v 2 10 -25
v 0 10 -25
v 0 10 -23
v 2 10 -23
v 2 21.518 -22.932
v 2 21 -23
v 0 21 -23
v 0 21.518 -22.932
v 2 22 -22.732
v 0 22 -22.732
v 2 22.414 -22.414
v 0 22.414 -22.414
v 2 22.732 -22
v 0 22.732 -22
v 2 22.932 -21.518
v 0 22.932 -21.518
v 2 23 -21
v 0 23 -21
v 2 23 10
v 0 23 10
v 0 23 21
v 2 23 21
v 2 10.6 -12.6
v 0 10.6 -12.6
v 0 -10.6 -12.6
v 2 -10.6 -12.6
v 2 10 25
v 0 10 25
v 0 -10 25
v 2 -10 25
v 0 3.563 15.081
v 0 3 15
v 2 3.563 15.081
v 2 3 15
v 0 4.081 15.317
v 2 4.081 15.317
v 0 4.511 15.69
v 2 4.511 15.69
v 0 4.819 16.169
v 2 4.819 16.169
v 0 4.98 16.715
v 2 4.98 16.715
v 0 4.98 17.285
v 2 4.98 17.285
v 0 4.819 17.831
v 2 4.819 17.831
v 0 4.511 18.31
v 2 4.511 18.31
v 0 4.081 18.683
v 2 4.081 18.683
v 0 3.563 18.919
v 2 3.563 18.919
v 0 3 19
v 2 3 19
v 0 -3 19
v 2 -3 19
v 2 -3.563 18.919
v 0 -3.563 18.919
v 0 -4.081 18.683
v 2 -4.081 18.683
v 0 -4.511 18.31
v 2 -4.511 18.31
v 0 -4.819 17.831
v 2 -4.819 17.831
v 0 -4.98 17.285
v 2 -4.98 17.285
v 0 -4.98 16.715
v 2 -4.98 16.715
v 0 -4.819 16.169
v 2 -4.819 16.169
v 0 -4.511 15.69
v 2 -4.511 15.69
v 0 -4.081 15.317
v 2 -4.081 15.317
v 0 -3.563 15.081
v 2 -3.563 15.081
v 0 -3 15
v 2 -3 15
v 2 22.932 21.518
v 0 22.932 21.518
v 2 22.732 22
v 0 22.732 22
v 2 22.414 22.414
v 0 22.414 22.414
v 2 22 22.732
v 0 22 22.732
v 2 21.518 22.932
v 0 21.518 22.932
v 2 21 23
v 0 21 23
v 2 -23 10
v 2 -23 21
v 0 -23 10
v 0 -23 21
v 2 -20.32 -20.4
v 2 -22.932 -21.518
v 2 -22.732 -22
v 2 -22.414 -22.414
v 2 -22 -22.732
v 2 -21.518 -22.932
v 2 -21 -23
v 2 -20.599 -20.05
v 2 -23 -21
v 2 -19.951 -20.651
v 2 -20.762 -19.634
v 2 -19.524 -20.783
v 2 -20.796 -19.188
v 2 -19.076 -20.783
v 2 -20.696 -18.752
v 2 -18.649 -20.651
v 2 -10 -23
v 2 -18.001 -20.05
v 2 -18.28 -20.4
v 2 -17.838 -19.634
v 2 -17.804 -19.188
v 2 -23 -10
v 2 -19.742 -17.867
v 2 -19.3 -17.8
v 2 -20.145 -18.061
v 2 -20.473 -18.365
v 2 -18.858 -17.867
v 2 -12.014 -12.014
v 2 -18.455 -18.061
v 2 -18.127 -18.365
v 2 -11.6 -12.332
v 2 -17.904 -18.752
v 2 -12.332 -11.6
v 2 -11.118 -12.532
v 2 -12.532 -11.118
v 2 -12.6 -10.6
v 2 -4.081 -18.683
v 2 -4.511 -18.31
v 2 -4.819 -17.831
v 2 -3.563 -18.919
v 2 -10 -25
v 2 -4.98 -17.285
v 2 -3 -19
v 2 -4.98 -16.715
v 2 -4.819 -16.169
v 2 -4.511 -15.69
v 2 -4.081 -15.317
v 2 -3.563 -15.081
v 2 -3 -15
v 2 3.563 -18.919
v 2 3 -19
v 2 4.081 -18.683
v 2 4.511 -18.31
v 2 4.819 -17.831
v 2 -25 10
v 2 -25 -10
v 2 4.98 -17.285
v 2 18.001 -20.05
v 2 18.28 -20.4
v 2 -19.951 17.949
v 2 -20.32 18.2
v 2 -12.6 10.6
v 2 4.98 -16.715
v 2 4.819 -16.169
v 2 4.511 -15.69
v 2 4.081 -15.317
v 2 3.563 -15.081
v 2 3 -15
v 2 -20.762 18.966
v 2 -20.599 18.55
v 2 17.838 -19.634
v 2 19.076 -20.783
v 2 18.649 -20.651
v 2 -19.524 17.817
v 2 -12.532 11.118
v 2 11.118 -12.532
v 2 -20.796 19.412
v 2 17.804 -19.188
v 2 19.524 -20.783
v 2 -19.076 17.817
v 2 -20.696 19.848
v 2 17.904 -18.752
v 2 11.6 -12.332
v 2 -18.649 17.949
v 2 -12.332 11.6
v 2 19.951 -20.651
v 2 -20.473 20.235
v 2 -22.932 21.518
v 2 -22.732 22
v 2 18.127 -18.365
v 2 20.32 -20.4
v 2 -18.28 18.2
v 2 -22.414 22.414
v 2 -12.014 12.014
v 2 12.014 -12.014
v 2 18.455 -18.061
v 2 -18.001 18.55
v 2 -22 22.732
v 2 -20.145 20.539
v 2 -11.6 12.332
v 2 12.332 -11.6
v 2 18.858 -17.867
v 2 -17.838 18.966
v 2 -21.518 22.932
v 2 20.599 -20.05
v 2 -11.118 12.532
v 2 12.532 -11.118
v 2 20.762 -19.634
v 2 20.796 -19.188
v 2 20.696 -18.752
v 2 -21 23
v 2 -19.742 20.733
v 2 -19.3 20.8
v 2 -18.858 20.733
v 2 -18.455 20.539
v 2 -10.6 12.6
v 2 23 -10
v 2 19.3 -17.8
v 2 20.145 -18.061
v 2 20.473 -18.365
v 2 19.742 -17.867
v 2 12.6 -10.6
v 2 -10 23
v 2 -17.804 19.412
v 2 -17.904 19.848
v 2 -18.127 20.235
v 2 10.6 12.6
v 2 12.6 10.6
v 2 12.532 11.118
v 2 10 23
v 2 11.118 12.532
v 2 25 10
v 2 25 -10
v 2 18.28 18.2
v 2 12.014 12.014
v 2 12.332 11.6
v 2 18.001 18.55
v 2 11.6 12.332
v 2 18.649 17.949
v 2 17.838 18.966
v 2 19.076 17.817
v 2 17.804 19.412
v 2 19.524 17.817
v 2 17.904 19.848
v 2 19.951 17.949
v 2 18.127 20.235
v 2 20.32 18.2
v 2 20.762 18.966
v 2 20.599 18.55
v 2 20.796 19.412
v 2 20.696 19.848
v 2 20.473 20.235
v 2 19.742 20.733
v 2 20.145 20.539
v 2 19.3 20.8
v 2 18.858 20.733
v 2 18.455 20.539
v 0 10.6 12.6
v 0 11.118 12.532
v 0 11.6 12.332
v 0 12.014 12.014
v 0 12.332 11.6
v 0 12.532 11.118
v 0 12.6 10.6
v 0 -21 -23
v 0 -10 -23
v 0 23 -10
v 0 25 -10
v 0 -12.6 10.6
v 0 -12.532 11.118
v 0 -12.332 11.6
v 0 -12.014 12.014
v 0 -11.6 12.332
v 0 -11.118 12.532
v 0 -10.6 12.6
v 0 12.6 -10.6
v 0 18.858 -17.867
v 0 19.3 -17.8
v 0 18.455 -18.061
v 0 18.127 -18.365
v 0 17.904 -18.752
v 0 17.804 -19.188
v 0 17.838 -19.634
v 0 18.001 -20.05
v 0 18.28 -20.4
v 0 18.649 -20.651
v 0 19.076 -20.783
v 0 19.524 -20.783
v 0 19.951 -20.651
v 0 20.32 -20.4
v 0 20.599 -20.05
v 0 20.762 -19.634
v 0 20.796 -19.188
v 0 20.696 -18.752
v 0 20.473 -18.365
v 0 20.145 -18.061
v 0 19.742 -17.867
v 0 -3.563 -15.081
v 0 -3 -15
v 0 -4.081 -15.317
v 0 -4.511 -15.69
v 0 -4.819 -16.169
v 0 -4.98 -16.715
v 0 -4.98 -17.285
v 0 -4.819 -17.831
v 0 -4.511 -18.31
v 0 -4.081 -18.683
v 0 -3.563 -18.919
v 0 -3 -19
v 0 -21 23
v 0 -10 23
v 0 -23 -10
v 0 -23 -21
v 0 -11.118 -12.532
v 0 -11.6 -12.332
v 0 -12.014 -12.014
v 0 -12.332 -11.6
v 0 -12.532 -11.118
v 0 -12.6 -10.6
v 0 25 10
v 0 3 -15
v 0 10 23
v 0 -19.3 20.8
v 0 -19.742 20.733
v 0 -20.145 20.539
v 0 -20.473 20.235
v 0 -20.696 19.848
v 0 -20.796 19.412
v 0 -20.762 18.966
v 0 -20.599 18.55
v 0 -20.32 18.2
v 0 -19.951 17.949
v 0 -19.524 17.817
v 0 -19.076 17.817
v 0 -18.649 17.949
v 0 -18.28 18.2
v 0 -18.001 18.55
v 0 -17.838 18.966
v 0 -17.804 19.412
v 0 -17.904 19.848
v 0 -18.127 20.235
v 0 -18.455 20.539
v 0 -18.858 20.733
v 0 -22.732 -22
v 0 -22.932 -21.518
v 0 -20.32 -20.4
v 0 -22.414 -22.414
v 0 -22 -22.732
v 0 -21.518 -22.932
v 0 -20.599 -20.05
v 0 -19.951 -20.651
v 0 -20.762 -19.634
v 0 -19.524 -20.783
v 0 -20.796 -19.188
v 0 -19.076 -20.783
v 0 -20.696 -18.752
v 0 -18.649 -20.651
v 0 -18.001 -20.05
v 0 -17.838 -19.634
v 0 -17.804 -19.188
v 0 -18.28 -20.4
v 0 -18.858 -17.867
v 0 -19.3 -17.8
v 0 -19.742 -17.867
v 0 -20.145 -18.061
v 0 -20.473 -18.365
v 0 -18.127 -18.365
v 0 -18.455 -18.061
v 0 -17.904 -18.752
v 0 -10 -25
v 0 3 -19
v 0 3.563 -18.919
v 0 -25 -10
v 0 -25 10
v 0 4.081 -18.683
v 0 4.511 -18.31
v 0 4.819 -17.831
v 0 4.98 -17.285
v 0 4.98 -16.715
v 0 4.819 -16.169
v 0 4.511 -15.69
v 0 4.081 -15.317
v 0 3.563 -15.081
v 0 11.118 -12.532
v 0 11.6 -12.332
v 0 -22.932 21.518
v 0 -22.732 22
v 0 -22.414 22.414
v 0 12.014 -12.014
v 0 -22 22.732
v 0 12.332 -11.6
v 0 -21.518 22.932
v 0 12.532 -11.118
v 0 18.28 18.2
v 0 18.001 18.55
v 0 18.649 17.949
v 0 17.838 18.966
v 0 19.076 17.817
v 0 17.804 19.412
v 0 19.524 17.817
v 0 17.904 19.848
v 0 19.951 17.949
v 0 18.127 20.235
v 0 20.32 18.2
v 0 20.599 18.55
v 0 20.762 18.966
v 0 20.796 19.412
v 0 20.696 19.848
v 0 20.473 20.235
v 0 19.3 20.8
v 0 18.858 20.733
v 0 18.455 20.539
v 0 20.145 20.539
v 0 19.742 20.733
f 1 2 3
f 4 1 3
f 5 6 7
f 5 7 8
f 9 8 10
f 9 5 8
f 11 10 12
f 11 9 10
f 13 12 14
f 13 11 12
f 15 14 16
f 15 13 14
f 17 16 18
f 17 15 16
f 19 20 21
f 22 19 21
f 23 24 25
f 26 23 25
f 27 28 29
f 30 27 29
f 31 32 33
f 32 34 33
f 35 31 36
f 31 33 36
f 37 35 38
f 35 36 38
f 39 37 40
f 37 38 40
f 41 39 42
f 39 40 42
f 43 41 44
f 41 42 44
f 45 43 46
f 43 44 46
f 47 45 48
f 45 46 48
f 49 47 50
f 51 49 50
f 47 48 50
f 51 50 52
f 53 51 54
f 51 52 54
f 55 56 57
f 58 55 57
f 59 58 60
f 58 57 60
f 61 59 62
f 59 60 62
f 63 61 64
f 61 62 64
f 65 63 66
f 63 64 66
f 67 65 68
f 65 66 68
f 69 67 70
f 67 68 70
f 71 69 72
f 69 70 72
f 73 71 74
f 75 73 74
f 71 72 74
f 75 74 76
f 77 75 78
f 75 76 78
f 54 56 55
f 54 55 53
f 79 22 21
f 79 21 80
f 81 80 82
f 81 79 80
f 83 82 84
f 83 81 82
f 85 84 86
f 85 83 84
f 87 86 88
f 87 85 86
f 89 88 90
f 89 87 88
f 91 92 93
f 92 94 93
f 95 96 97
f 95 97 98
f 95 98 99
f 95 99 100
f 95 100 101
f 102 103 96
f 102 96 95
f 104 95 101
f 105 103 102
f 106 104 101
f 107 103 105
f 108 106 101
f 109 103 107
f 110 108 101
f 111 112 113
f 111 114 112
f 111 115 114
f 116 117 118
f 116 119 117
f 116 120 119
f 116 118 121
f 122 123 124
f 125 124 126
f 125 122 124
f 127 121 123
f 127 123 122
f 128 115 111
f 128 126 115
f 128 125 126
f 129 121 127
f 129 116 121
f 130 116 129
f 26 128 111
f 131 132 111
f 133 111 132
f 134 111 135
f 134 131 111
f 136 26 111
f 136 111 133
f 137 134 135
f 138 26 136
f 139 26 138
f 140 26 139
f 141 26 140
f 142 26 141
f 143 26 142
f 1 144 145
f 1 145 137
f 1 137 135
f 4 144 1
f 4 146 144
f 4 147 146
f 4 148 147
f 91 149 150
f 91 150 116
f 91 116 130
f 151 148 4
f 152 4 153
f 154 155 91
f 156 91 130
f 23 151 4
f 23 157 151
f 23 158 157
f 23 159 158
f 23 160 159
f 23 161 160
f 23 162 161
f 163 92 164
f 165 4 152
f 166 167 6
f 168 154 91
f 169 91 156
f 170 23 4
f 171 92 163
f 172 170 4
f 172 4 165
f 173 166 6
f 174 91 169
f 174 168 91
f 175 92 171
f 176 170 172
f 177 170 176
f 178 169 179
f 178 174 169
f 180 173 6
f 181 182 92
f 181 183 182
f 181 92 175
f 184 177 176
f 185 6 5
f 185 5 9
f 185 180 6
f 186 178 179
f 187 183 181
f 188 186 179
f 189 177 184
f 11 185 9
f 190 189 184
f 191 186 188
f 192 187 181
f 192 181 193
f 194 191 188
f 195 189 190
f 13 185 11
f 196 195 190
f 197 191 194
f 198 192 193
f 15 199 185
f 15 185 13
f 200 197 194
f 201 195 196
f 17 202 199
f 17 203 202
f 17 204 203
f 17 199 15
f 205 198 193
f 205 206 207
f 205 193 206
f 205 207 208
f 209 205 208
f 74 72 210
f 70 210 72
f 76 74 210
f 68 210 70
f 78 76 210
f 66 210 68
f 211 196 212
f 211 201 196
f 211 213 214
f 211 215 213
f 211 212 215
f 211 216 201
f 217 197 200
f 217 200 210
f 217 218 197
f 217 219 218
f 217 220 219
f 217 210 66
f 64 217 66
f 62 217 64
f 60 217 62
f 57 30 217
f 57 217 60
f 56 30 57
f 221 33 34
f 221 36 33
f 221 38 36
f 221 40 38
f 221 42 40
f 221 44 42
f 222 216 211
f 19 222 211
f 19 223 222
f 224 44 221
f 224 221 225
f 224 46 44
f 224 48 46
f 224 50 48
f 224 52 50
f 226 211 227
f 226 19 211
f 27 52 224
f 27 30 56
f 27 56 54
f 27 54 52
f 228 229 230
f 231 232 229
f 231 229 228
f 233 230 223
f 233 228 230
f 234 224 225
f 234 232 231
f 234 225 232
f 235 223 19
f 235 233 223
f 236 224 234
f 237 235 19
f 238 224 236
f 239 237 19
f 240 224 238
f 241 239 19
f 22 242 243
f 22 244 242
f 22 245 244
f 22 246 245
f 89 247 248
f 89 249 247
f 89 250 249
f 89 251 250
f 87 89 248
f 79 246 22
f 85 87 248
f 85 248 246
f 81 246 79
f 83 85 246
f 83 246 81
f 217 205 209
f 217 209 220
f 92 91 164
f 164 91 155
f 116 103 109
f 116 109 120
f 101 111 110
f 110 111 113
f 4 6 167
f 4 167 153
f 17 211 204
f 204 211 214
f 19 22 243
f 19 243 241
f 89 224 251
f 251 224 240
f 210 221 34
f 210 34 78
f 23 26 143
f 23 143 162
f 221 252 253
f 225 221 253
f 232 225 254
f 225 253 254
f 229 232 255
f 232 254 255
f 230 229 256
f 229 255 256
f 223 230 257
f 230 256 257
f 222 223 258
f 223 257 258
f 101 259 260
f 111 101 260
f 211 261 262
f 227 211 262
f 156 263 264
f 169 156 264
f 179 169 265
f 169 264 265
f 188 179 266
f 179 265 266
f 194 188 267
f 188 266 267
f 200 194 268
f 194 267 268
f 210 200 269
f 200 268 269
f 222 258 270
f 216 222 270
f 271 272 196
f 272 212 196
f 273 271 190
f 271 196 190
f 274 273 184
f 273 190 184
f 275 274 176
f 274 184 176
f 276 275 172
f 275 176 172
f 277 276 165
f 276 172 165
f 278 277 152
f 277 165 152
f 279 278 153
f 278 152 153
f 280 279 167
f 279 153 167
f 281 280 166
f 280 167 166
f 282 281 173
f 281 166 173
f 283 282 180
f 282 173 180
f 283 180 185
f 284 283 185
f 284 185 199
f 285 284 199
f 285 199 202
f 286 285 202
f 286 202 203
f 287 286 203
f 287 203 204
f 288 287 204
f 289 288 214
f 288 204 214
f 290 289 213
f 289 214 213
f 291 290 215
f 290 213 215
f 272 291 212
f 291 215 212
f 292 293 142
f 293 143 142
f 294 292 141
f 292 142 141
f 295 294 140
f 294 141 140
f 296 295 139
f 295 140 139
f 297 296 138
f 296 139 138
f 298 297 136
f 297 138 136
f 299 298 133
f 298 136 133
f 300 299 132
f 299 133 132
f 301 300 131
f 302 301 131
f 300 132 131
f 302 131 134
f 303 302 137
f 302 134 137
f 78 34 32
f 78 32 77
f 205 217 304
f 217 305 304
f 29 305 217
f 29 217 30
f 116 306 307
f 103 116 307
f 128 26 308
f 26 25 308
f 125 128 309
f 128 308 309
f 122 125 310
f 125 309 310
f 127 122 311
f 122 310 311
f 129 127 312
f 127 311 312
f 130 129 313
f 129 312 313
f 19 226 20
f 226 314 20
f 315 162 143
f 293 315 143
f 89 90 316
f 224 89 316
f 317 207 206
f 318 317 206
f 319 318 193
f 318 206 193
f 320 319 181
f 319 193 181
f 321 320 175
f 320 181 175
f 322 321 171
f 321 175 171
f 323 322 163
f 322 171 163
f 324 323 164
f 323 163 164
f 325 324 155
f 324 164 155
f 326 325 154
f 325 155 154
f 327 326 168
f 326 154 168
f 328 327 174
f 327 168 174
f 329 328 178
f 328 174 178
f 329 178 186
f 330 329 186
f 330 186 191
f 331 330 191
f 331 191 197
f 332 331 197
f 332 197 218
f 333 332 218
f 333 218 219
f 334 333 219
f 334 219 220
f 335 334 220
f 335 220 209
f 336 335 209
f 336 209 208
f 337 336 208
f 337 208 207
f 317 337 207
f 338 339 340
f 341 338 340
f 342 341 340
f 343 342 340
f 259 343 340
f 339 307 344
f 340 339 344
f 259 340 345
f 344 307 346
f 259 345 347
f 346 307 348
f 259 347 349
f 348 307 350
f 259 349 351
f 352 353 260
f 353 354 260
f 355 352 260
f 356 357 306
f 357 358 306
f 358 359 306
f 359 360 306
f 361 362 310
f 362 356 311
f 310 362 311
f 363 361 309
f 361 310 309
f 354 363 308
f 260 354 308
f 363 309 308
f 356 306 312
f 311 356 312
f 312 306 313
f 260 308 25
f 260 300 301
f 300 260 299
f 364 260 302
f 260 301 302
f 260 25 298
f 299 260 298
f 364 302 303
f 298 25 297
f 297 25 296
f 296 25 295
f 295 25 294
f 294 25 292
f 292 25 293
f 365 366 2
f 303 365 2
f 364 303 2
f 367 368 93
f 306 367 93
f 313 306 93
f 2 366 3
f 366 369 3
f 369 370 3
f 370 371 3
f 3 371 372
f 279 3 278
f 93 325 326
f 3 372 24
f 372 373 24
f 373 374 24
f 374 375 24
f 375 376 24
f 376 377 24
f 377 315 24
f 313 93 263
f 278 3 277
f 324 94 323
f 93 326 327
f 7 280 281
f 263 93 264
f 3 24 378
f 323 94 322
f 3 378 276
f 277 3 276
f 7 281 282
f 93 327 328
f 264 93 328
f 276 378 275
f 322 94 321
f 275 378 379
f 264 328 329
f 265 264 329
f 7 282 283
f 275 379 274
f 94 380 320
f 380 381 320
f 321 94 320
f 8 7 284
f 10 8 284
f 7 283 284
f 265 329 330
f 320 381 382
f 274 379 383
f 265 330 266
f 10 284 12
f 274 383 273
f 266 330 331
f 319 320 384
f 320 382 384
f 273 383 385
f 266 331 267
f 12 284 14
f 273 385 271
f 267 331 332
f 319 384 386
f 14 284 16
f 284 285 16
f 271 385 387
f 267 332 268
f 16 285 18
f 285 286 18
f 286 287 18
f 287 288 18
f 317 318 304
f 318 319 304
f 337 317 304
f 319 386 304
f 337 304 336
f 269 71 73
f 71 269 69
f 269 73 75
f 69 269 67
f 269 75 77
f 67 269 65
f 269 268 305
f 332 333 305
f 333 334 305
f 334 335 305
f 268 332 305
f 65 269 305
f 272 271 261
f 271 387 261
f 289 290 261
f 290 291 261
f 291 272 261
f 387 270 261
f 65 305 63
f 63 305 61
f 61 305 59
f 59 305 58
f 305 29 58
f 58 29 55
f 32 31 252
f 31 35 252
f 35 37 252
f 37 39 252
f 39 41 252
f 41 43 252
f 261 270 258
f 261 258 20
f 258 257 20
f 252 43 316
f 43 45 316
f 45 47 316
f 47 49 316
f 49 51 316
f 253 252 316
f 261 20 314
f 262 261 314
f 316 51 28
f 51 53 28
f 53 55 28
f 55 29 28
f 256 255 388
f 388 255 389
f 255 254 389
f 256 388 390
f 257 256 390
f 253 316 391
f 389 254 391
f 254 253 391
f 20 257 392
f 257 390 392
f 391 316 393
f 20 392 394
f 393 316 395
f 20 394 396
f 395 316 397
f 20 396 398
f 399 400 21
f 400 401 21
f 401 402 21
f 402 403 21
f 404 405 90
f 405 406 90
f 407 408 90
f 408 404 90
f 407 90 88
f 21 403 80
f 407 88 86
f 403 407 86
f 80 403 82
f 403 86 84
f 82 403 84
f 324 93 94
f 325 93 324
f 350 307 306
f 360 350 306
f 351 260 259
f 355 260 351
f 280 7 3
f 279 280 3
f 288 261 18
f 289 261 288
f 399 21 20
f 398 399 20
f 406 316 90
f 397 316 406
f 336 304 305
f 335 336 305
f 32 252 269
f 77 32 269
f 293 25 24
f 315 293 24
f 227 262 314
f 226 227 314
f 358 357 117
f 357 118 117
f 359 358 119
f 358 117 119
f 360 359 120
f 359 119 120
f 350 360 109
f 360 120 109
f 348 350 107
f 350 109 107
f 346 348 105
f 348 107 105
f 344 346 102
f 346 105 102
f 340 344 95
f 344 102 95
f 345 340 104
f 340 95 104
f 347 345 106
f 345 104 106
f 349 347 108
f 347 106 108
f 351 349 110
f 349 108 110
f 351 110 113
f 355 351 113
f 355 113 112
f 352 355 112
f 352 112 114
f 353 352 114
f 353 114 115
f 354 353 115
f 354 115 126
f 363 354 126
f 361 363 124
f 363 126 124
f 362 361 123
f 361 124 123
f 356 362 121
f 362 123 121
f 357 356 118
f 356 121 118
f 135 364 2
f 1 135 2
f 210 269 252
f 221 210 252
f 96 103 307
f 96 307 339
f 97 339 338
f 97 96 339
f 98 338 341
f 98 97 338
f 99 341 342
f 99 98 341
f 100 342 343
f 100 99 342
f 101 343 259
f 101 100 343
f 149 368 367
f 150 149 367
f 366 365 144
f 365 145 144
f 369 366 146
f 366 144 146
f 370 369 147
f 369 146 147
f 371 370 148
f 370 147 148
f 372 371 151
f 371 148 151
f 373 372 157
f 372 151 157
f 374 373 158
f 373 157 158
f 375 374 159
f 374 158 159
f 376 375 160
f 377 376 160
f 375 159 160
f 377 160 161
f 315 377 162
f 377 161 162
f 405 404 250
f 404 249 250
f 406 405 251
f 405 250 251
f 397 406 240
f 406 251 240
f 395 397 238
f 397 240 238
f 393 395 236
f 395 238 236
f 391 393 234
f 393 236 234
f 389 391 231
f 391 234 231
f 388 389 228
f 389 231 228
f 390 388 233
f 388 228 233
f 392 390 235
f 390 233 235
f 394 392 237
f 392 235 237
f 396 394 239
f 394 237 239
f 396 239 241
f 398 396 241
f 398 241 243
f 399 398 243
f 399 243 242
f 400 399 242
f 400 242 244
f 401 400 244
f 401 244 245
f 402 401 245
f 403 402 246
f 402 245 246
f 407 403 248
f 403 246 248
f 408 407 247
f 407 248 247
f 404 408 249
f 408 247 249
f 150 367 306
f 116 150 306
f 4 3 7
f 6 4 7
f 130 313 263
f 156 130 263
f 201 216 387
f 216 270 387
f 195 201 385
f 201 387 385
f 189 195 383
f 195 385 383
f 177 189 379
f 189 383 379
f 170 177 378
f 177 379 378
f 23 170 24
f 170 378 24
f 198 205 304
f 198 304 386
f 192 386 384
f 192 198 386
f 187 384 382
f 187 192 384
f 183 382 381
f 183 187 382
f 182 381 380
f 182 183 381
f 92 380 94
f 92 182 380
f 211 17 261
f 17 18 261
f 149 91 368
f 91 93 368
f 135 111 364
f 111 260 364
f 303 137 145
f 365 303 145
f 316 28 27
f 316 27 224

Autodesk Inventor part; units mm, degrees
ref_plane "YZ Plane" through (0, 0, 0) normal (1, 0, 0) x (0, 1, 0)
ref_plane "XZ Plane" through (0, 0, 0) normal (0, 1, 0) x (-1, 0, 0)
ref_plane "XY Plane" through (0, 0, 0) normal (0, 0, 1) x (1, 0, 0)
sketch "Sketch1" plane through (0, 0, 0) normal (1, 0, 0) x (0, 1, 0)
  line L0 (-25, -25) -> (25, -25)
  line L1 (25, -25) -> (25, 25)
  line L2 (25, 25) -> (-25, 25)
  line L3 (-25, 25) -> (-25, -25)
  line L4 (-25, -25) -> (25, 25) construction
  line L5 (25, -25) -> (-25, 25) construction
  line L6 (-24, -24) -> (24, -24)
  line L7 (24, -24) -> (24, 24)
  line L8 (24, 24) -> (-24, 24)
  line L9 (-24, 24) -> (-24, -24)
  line L10 (-24, -24) -> (24, 24) construction
  line L11 (24, -24) -> (-24, 24) construction
  point P0 (0, 0)
  dimension "d0" = 50
  dimension "d1" = 50
  dimension "d2" = 48
  dimension "d3" = 48
extrude "Extrusion1" add sketch "Sketch1" along normal blind 2 contours L3 L2 L1 L0 | L9 L8 L7 L6
sketch "Sketch3" plane through (0, 0, 0) normal (-1, 0, 0) x (0, 0, 1)
  line L0 (19.3, -19.3) -> (-19.3, -19.3)
  line L1 (-19.3, -19.3) -> (-19.3, 19.3)
  line L2 (-19.3, 19.3) -> (19.3, 19.3)
  line L3 (19.3, 19.3) -> (19.3, -19.3)
  line L4 (19.3, -19.3) -> (-19.3, 19.3) construction
  line L5 (-19.3, -19.3) -> (19.3, 19.3) construction
  circle A0 centre (-19.3, 19.3) radius 1.5
  circle A1 centre (19.3, 19.3) radius 1.5555
  circle A2 centre (19.3, -19.3) radius 1.5555
  circle A3 centre (-19.3, -19.3) radius 1.5555
  point P0 (0, 0)
  dimension "d6" = 38.6
  dimension "d7" = 38.6
  dimension "d8" = 3
  dimension "d9" = 3.111
  dimension "d10" = 3.111
  dimension "d11" = 3.111
hole "Hole1" at (0, 19.3, -19.3) direction (1, 0, 0) diameter 3 end through all
sketch "Sketch4" plane through (0, 0, 0) normal (-1, 0, 0) x (0, 0, 1)
  line L0 (-19.3, -19.3) -> (19.3, -19.3)
  line L1 (19.3, -19.3) -> (19.3, 19.3)
  line L2 (19.3, 19.3) -> (-19.3, 19.3)
  line L3 (-19.3, 19.3) -> (-19.3, -19.3)
  line L4 (-19.3, -19.3) -> (19.3, 19.3) construction
  line L5 (19.3, -19.3) -> (-19.3, 19.3) construction
  circle A0 centre (19.3, 19.3) radius 1.5
  point P0 (0, 0)
  dimension "d19" = 38.6
  dimension "d20" = 38.6
  dimension "d21" = 3
hole "Hole2" at (0, 19.3, 19.3) direction (1, 0, 0) diameter 3 end through all
sketch "Sketch5" plane through (0, 0, 0) normal (-1, 0, 0) x (0, 0, 1)
  line L0 (19.3, -19.3) -> (-19.3, -19.3)
  line L1 (-19.3, -19.3) -> (-19.3, 19.3)
  line L2 (-19.3, 19.3) -> (19.3, 19.3)
  line L3 (19.3, 19.3) -> (19.3, -19.3)
  line L4 (19.3, -19.3) -> (-19.3, 19.3) construction
  line L5 (-19.3, -19.3) -> (19.3, 19.3) construction
  circle A0 centre (-19.3, -19.3) radius 1.5
  point P0 (0, 0)
  dimension "d29" = 38.6
  dimension "d30" = 38.6
  dimension "d31" = 3
hole "Hole3" at (0, -19.3, -19.3) direction (1, 0, 0) diameter 3 end through all
sketch "Sketch6" plane through (0, 0, 0) normal (-1, 0, 0) x (0, 0, 1)
  line L0 (19.3, -19.3) -> (-19.3, -19.3)
  line L1 (-19.3, -19.3) -> (-19.3, 19.3)
  line L2 (-19.3, 19.3) -> (19.3, 19.3)
  line L3 (19.3, 19.3) -> (19.3, -19.3)
  line L4 (19.3, -19.3) -> (-19.3, 19.3) construction
  line L5 (-19.3, -19.3) -> (19.3, 19.3) construction
  circle A0 centre (19.3, -19.3) radius 1.5
  point P0 (0, 0)
  dimension "d39" = 38.6
  dimension "d40" = 38.6
  dimension "d41" = 3
hole "Hole4" at (0, -19.3, 19.3) direction (1, 0, 0) diameter 3 end through all
sketch "Sketch7" plane through (0, 0, 0) normal (-1, 0, 0) x (0, 0, 1)
  line L0 (23, -23) -> (-23, -23)
  line L1 (-23, -23) -> (-23, 23)
  line L2 (-23, 23) -> (23, 23)
  line L3 (23, 23) -> (23, -23)
  line L4 (23, -23) -> (-23, 23) construction
  line L5 (-23, -23) -> (23, 23) construction
  line L6 (-25, 25) -> (25, 25) projected
  line L7 (10, 21) -> (-10, 21)
  line L8 (-10, 21) -> (-10, 25)
  line L9 (-10, 25) -> (10, 25)
  line L10 (10, 25) -> (10, 21)
  line L11 (10, 21) -> (-10, 25) construction
  line L12 (-10, 21) -> (10, 25) construction
  line L13 (21, -10) -> (25, -10)
  line L14 (25, -10) -> (25, 10)
  line L15 (25, 10) -> (21, 10)
  line L16 (21, 10) -> (21, -10)
  line L17 (21, -10) -> (25, 10) construction
  line L18 (25, -10) -> (21, 10) construction
  line L19 (25, -25) -> (-25, -25) projected
  line L20 (-10, -21) -> (10, -21)
  line L21 (10, -21) -> (10, -25)
  line L22 (10, -25) -> (-10, -25)
  line L23 (-10, -25) -> (-10, -21)
  line L24 (-10, -21) -> (10, -25) construction
  line L25 (10, -21) -> (-10, -25) construction
  line L26 (-25.0252, 10) -> (-20.9748, 10)
  line L27 (-20.9748, 10) -> (-20.9748, -10)
  line L28 (-20.9748, -10) -> (-25.0252, -10)
  line L29 (-25.0252, -10) -> (-25.0252, 10)
  line L30 (-25.0252, 10) -> (-20.9748, -10) construction
  line L31 (-20.9748, 10) -> (-25.0252, -10) construction
  line L32 (25, -25) -> (-25, -25)
  line L33 (-25, -25) -> (-25, 25)
  line L34 (-25, 25) -> (25, 25)
  line L35 (25, 25) -> (25, -25)
  line L36 (25, -25) -> (-25, 25) construction
  line L37 (-25, -25) -> (25, 25) construction
  point P0 (0, 0)
  point P1 (0, 23)
  point P2 (23, 0)
  point P3 (0, -23)
  point P4 (-23, 0)
  point P5 (-10, 23)
  point P6 (10, 23)
  point P7 (23, 10)
  point P8 (23, -10)
  point P9 (10, -23)
  point P10 (-10, -23)
  point P11 (-23, -10)
  point P12 (-23, 10)
  point P13 (10, 25)
  point P14 (-25, 10)
  point P15 (-25, -10)
  point P16 (-10, -25)
  dimension "d49" = 46
  dimension "d50" = 46
  dimension "d51" = 20
  dimension "d52" = 20
  dimension "d53" = 20
  dimension "d54" = 20
extrude "Extrusion3" cut sketch "Sketch7" against normal blind 2 contours L3 L13 L35 L19 L21 L0 | L23 L19 L33 L28 L1 L0 | L3 L2 L10 L6 L35 L15 | L26 L33 L6 L8 L2 L1
sketch "Sketch9" plane through (0, 0, 0) normal (-1, 0, 0) x (0, 0, 1)
  line L0 (10.6, 12.6) -> (-10.6, 12.6)
  line L1 (-12.6, 10.6) -> (-12.6, -10.6)
  line L2 (-10.6, -12.6) -> (10.6, -12.6)
  line L3 (12.6, -10.6) -> (12.6, 10.6)
  line L4 (12.6, 12.6) -> (-12.6, -12.6) construction
  line L5 (-12.6, 12.6) -> (12.6, -12.6) construction
  arc A0 (-12.6, -10.6) -> (-10.6, -12.6) centre (-10.6, -10.6) ccw
  arc A1 (-10.6, 12.6) -> (-12.6, 10.6) centre (-10.6, 10.6) ccw
  arc A2 (12.6, 10.6) -> (10.6, 12.6) centre (10.6, 10.6) ccw
  arc A3 (10.6, -12.6) -> (12.6, -10.6) centre (10.6, -10.6) ccw
  point P0 (0, 0)
  dimension "d62" = 25.2
  dimension "d63" = 25.2
  dimension "d64" = 2
extrude "Extrusion4" cut sketch "Sketch9" against normal blind 2
sketch "Sketch10" plane through (2, 0, 0) normal (1, 0, 0) x (0, 0, -1)
  line L0 (-17, -3) -> (-17, 3) construction
  line L1 (-19, -3) -> (-19, 3)
  line L2 (-15, 3) -> (-15, -3)
  arc A0 (-19, -3) -> (-15, -3) centre (-17, -3) ccw
  arc A1 (-15, 3) -> (-19, 3) centre (-17, 3) ccw
  line L3 (17, -3) -> (17, 3) construction
  line L4 (19, -3) -> (19, 3)
  line L5 (15, 3) -> (15, -3)
  arc A2 (15, -3) -> (19, -3) centre (17, -3) ccw
  arc A3 (19, 3) -> (15, 3) centre (17, 3) ccw
  point P0 (0, 0)
  point P1 (-17, 0)
  point P2 (17, 0)
  dimension "d67" = 17
  dimension "d68" = 17
  dimension "d69" = 4
  dimension "d70" = 4
  dimension "d71" = 10
extrude "Extrusion5" cut sketch "Sketch10" against normal blind 10
fillet "Fillet1" radius 2 4 edges at (1, -23, 23) (1, -23, -23) (1, 23, -23) (1, 23, 23)
properties part number "BottomSide"
